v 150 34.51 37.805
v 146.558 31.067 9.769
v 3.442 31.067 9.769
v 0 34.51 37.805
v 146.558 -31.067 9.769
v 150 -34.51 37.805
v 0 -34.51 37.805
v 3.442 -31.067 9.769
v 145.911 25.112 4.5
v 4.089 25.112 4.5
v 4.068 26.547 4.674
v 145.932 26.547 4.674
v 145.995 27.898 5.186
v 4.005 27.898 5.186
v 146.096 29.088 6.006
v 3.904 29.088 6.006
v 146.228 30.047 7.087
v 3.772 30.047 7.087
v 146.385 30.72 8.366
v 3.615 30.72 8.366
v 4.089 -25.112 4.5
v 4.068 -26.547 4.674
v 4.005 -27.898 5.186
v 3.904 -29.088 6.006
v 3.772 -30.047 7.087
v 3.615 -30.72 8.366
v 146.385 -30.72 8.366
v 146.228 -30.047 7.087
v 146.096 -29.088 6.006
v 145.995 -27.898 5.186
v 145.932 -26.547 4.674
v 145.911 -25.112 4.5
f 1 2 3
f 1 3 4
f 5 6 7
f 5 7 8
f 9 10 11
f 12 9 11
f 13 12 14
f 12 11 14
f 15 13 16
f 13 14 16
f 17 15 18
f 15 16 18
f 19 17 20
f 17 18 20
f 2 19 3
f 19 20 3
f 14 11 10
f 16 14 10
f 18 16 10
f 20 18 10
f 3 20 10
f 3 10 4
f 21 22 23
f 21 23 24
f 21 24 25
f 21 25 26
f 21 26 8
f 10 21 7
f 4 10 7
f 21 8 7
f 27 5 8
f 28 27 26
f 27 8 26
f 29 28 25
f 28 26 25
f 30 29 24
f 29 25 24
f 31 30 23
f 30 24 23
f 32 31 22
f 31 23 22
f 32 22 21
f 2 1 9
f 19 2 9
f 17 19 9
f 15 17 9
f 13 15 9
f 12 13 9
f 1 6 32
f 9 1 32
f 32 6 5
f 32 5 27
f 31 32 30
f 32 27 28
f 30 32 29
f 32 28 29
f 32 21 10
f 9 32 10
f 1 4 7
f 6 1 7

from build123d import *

# Parameters (mm, degrees)
F1_DEPTH      = 150
F3_DEPTH      = 34.5108737383
F3_DEPTH_BACK = 34.5108737383


with BuildPart() as f1:
    # F0 (on Right) → F1 (new body)
    with BuildSketch(Plane.YZ):
        with BuildLine():
            Line((34.5098737383, 37.8046733585), (-34.5098737383, 37.8046733585))
            Line((-34.5098737383, 37.8046733585), (-31.0674993665, 9.7687839396))
            ThreePointArc((-31.0674993665, 9.7687839396), (-29.0879427459, 6.0062656753), (-25.1122224566, 4.5))
            Line((-25.1122224566, 4.5), (25.1122224566, 4.5))
            ThreePointArc((25.1122224566, 4.5), (29.0879427459, 6.0062656753), (31.0674993665, 9.7687839396))
            Line((31.0674993665, 9.7687839396), (34.5098737383, 37.8046733585))
        make_face()
    extrude(amount=F1_DEPTH)

    # F2 (on Front) → F3 (cut, two sides)
    with BuildSketch(Plane.XZ) as f3_sk:
        Polygon((4.0892996943, 4.5), (0, 37.8046733585), (0, 4.5), align=None)
        Polygon((150, 37.8046733585), (145.9107003057, 4.5), (150, 4.5), align=None)
    extrude(amount=-F3_DEPTH, mode=Mode.SUBTRACT)
    extrude(f3_sk.sketch, amount=F3_DEPTH_BACK, mode=Mode.SUBTRACT)


solid = f1.part
